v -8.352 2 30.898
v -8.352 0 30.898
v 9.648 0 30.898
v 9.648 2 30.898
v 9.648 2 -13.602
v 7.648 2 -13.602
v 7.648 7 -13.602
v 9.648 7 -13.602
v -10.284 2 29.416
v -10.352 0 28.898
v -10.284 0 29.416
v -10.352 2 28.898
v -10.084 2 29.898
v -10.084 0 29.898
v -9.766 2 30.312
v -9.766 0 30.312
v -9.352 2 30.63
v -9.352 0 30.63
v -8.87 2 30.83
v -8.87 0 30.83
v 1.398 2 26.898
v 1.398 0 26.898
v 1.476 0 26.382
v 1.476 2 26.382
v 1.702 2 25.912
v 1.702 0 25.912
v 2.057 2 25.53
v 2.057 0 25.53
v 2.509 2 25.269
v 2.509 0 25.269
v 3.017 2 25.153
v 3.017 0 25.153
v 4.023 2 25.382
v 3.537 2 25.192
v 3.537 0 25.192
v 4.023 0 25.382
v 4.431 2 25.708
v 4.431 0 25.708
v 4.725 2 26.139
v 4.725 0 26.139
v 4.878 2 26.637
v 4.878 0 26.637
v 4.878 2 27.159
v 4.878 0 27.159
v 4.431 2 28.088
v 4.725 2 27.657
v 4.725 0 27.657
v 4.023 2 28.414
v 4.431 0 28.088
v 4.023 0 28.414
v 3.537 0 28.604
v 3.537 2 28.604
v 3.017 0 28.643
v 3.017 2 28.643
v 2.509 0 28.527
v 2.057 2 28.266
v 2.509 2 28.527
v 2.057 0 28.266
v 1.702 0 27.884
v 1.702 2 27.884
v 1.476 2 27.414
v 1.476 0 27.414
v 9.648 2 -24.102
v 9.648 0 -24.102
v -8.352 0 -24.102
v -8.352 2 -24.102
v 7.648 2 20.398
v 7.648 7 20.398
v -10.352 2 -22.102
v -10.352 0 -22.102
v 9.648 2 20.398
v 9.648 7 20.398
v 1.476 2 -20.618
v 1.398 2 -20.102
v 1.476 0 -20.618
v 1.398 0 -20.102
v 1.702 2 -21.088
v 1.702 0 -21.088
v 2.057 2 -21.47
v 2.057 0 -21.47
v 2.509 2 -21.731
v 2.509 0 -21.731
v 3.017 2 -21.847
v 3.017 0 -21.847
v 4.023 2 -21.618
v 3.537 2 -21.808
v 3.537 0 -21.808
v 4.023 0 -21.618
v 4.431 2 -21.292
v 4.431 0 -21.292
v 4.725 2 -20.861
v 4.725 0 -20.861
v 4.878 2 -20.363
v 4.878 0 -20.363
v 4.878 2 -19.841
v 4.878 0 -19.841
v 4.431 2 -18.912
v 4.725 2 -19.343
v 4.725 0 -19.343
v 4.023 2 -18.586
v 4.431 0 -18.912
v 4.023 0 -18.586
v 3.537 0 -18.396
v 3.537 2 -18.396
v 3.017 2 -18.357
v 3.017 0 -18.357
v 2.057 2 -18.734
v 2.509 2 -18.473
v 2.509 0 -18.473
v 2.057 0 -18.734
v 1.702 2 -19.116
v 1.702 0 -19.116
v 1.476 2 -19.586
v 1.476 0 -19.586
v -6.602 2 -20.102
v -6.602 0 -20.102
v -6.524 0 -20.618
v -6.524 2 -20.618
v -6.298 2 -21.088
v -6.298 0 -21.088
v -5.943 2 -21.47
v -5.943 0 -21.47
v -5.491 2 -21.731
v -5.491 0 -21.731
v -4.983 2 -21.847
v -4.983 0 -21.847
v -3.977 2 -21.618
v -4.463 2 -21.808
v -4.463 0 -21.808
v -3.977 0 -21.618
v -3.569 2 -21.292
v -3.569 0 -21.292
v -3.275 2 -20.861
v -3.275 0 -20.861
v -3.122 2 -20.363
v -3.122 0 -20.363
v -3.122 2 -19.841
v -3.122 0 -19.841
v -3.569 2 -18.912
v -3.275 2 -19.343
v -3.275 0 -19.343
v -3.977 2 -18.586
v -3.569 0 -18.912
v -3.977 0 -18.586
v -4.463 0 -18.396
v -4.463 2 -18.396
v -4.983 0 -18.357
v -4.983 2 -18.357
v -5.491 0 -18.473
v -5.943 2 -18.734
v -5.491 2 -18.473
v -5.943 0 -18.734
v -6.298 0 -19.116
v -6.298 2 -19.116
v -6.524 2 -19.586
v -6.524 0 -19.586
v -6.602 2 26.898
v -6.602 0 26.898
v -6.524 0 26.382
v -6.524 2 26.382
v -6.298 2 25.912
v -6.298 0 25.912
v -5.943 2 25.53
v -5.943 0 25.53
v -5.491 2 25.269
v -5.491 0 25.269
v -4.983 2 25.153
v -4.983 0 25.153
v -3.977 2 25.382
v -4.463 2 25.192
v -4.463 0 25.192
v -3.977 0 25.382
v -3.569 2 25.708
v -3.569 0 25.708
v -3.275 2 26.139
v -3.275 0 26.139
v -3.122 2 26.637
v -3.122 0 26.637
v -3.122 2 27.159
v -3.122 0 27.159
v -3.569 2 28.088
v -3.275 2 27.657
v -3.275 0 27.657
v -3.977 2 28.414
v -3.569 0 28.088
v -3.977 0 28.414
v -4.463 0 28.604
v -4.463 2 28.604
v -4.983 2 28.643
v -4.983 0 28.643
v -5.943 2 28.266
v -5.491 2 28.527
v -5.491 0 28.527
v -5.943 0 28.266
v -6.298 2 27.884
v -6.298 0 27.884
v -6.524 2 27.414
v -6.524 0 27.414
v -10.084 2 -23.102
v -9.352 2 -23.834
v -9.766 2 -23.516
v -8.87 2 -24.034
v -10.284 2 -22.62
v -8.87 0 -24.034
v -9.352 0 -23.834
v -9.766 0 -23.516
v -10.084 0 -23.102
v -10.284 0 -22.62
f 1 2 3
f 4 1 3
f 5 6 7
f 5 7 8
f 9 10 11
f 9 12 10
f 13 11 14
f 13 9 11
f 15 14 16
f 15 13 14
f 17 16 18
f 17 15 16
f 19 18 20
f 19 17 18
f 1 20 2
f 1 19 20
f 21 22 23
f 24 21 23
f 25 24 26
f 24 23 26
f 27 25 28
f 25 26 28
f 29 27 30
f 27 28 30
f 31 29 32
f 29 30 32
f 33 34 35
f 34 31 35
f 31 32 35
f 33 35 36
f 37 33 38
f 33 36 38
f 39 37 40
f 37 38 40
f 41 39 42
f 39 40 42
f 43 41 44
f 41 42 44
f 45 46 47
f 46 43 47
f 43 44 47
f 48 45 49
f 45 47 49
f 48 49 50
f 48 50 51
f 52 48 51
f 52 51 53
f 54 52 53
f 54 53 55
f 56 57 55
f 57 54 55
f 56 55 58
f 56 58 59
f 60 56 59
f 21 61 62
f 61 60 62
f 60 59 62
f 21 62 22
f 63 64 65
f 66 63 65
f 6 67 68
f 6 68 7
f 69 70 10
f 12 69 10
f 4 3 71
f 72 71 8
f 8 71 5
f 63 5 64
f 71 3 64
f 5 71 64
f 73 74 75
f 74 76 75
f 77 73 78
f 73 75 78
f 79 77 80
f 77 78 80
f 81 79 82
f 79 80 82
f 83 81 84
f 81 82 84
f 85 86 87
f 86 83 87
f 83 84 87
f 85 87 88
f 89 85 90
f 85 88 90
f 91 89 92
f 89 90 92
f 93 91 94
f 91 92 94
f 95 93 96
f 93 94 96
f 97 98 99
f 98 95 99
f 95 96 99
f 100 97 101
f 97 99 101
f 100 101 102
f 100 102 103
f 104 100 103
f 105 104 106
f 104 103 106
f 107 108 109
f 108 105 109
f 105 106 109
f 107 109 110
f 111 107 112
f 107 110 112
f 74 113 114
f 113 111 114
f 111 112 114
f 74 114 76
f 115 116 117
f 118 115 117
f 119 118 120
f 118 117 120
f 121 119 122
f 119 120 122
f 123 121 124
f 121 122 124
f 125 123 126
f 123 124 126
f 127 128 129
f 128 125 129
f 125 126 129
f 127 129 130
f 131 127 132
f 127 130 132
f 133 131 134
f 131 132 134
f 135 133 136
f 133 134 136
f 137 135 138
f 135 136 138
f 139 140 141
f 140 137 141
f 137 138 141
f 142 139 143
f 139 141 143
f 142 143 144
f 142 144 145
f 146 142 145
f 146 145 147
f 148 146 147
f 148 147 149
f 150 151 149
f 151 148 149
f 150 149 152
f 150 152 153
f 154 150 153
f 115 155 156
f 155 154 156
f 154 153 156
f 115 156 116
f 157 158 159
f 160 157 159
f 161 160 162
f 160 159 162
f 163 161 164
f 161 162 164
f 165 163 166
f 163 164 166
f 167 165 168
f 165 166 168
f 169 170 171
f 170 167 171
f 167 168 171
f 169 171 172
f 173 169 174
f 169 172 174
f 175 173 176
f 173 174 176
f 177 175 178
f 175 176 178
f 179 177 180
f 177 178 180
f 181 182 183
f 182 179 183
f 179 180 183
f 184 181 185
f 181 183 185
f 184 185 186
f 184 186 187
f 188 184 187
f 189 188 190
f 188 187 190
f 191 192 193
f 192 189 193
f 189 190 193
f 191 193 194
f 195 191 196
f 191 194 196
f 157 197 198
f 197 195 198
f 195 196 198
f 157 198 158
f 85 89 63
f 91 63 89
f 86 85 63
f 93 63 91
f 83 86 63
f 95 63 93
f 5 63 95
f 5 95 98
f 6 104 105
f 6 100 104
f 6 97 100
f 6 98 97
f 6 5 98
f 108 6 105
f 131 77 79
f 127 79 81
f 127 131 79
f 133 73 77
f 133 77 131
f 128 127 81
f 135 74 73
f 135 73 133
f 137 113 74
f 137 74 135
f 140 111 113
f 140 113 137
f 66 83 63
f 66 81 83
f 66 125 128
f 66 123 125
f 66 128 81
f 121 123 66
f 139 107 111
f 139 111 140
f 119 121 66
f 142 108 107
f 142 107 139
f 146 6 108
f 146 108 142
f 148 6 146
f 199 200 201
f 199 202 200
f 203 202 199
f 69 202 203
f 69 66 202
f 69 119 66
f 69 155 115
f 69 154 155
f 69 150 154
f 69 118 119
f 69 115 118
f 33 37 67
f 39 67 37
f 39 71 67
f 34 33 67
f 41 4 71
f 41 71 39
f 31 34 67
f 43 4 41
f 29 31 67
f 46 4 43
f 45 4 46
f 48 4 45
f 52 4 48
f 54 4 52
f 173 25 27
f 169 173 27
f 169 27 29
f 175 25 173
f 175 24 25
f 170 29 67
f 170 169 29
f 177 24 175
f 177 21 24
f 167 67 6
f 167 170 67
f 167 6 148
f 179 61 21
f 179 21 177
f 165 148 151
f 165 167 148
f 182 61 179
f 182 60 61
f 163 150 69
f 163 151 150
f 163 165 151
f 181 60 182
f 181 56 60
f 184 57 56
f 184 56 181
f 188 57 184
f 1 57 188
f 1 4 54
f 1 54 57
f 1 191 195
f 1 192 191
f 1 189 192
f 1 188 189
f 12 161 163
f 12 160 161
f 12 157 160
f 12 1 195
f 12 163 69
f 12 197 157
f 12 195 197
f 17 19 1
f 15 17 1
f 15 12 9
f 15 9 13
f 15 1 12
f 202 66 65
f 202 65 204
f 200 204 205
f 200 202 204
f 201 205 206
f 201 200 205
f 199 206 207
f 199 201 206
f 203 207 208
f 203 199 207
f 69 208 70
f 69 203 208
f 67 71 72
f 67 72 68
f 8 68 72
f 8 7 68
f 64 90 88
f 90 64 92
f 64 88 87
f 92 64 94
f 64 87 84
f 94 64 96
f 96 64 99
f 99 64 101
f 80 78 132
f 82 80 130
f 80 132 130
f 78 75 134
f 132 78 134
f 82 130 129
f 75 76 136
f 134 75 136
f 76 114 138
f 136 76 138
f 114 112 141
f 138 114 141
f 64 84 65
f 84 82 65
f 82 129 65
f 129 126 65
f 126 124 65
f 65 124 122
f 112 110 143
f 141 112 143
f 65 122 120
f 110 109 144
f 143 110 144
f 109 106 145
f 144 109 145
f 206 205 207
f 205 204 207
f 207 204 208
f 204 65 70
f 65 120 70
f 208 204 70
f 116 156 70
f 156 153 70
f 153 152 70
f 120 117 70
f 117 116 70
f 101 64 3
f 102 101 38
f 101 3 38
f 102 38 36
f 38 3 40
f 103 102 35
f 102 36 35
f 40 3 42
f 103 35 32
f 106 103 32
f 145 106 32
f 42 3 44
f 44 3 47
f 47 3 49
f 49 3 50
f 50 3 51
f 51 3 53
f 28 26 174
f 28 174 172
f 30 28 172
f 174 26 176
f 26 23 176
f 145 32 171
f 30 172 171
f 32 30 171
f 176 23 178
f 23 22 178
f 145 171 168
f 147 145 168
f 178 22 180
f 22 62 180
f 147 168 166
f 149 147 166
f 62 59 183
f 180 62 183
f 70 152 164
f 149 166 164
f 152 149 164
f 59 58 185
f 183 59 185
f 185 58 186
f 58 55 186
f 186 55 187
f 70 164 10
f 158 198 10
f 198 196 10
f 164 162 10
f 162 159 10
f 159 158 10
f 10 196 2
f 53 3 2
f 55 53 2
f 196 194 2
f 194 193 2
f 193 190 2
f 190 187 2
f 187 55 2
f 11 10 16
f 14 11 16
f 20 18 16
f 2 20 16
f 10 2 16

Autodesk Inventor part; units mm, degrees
ref_plane "YZ Plane" through (0, 0, 0) normal (1, 0, 0) x (0, 1, 0)
ref_plane "XZ Plane" through (0, 0, 0) normal (0, 1, 0) x (-1, 0, 0)
ref_plane "XY Plane" through (0, 0, 0) normal (0, 0, 1) x (1, 0, 0)
sketch "Sketch1" plane through (0, 0, 0) normal (0, 1, 0) x (-1, 0, 0)
  line L0 (10.352, 30.898) -> (-9.648, 30.898)
  line L1 (-9.648, 30.898) -> (-9.648, -24.102)
  line L2 (-9.648, -24.102) -> (10.352, -24.102)
  line L3 (10.352, -24.102) -> (10.352, 30.898)
  circle A0 centre (4.852, 26.898) radius 1.75
  circle A1 centre (-3.148, 26.898) radius 1.75
  circle A2 centre (4.852, -20.102) radius 1.75
  circle A3 centre (-3.148, -20.102) radius 1.75
  point P0 (0, 0)
  dimension "d0" = 55
  dimension "d1" = 20
  dimension "d2" = 3.5
  dimension "d3" = 3.5
  dimension "d4" = 3.5
  dimension "d5" = 3.5
  dimension "d6" = 4
  dimension "d7" = 4
  dimension "d8" = 4
  dimension "d9" = 4
  dimension "d10" = 5.5
  dimension "d11" = 8
  dimension "d12" = 5.5
  dimension "d13" = 8
extrude "Extrusion1" add sketch "Sketch1" along normal blind 2
sketch "Sketch2" plane through (0, 2, 0) normal (0, 1, 0) x (1, 0, 0)
  line L0 (9.648, -30.898) -> (9.648, 24.102) projected
  line L1 (9.648, -20.398) -> (7.648, -20.398)
  line L2 (7.648, -20.398) -> (7.648, 13.602)
  line L3 (7.648, 13.602) -> (9.648, 13.602)
  line L4 (9.648, 13.602) -> (9.648, -20.398)
  line L5 (-10.352, -30.898) -> (9.648, -30.898) projected
  line L6 (9.648, 24.102) -> (-10.352, 24.102) projected
  point P0 (0, 0)
  dimension "d16" = 2
  dimension "d17" = 34
  dimension "d18" = 10.5
  dimension "d19" = 10.5
extrude "Extrusion2" add sketch "Sketch2" along normal blind 5
fillet "Fillet1" radius 2 2 edges at (-10.352, 1, 30.898) (-10.352, 1, -24.102)
properties part number "SwitchMountTop"
